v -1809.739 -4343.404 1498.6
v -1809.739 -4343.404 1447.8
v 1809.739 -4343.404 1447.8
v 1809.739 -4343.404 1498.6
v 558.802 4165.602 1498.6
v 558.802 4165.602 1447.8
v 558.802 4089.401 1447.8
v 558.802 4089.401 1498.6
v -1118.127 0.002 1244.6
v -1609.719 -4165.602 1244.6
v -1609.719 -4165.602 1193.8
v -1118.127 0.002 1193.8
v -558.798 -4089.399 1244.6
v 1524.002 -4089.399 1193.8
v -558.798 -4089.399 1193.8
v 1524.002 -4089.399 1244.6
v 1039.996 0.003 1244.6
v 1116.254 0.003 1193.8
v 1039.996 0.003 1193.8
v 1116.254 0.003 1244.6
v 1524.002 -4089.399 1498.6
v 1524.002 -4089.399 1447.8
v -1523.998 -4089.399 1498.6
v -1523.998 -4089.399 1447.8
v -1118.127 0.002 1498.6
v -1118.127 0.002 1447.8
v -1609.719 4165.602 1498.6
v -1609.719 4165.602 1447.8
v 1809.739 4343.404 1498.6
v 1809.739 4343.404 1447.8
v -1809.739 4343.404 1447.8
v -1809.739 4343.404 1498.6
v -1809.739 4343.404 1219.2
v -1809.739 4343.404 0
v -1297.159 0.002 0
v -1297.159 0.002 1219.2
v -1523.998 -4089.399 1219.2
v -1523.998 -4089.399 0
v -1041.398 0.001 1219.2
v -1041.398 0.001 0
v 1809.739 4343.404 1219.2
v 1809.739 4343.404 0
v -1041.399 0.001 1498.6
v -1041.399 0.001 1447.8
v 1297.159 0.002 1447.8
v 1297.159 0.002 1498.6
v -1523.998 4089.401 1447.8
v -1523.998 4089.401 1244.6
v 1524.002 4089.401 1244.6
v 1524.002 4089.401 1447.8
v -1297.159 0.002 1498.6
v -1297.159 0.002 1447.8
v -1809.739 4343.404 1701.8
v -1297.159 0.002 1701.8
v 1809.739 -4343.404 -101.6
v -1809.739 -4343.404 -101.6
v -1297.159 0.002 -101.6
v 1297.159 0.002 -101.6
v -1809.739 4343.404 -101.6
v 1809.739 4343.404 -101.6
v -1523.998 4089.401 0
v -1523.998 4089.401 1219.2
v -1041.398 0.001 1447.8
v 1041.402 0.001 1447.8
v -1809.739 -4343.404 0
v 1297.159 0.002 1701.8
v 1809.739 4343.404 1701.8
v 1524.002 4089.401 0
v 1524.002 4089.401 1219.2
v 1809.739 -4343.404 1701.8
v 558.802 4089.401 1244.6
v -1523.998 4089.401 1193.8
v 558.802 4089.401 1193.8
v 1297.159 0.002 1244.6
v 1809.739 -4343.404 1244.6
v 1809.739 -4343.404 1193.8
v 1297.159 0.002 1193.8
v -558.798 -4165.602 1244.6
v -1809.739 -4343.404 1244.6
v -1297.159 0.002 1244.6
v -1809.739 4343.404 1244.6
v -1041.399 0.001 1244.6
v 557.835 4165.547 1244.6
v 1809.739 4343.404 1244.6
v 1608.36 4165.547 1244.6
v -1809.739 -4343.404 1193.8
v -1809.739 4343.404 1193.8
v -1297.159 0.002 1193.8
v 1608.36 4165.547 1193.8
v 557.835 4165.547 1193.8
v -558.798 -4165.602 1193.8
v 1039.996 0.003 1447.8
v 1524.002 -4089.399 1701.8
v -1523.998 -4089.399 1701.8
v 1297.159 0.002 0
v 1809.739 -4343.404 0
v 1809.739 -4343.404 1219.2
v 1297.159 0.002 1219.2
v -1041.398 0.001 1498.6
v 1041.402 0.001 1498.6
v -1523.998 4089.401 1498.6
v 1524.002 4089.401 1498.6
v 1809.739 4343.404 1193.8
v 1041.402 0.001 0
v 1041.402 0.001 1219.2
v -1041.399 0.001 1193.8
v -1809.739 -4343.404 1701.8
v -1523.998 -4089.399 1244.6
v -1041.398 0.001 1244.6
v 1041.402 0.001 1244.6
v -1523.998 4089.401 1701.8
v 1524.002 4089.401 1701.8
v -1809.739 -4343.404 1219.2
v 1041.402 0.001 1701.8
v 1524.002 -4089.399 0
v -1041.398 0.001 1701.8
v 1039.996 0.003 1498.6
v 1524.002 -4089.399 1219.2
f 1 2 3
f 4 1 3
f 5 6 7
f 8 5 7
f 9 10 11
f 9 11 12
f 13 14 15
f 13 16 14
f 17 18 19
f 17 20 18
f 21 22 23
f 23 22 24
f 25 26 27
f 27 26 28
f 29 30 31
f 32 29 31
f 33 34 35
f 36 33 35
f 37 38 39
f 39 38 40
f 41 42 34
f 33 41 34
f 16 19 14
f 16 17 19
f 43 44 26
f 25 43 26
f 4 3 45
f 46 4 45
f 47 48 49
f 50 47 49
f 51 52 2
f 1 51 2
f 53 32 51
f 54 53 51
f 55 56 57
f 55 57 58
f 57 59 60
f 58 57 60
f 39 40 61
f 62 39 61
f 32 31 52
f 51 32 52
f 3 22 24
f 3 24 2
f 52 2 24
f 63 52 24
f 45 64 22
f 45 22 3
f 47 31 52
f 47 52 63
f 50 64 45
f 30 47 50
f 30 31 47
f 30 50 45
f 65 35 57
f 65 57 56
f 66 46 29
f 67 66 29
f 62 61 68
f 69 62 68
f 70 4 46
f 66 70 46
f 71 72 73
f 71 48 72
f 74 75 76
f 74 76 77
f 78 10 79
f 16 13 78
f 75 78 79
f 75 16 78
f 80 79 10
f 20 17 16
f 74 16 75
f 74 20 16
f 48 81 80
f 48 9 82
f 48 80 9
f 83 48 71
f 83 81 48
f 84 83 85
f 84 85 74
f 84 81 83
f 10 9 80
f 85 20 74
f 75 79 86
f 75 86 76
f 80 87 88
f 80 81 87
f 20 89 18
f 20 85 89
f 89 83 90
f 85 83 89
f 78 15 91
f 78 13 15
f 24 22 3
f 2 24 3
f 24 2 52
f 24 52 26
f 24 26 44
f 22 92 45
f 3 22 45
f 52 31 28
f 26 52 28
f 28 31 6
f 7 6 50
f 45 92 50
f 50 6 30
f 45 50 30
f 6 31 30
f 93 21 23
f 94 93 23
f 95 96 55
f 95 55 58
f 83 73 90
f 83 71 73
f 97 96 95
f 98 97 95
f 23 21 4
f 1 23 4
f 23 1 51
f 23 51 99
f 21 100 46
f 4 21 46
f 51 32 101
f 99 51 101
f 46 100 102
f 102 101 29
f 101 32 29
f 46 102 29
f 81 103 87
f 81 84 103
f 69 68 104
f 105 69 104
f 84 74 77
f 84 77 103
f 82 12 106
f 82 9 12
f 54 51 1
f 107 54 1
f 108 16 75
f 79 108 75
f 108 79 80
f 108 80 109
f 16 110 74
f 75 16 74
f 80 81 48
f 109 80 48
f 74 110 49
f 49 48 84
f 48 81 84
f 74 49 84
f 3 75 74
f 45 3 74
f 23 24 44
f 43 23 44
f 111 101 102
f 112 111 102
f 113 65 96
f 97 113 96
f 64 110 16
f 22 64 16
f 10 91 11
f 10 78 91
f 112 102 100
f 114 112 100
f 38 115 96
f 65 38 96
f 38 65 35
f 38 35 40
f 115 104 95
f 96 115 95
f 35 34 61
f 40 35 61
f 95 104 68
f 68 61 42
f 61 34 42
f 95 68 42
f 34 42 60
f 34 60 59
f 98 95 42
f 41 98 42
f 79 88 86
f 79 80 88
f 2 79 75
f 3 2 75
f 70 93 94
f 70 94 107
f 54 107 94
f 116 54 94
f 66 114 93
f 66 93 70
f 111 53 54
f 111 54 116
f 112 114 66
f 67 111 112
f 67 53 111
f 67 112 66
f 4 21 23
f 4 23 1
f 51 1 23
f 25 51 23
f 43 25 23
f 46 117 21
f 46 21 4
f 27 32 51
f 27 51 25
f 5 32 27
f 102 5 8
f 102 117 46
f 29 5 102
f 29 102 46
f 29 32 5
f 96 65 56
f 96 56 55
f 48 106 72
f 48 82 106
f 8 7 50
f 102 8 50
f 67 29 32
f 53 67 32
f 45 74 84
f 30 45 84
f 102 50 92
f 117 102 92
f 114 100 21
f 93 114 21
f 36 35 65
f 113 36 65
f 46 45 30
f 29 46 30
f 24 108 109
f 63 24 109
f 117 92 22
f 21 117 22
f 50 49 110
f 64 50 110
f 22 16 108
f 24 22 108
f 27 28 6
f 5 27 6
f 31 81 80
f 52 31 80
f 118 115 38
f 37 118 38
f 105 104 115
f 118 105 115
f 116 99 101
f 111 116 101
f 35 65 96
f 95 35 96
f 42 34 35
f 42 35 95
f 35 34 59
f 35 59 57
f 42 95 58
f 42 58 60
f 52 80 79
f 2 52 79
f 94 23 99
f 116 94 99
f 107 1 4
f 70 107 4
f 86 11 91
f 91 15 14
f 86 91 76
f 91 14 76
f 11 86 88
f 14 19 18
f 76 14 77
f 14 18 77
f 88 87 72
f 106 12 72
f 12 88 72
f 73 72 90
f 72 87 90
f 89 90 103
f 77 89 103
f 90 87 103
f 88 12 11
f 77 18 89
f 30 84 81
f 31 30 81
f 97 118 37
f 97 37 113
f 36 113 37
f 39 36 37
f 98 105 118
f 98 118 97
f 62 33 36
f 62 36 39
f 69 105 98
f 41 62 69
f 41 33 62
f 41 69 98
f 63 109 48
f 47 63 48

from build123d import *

# Parameters (mm, degrees)
F1_DEPTH  = 101.6
F2_DEPTH  = 1219.2
F5_DEPTH  = 25.4
F7_DEPTH  = 203.2
F10_DEPTH = 50.8
F13_DEPTH = 203.2


with BuildPart() as f1:
    # F0 (on Top) → F1 (new body)
    with BuildSketch(Plane.XY):
        Polygon((-1297.1585436, 0.0021844), (-1809.739078, -4343.4039624), (1809.739078, -4343.4039624), (1297.158569, 0.0021844), (1809.739078, 4343.4039878), (-1809.739078, 4343.4039878), align=None)
        Polygon((-1041.3984252, 0.0007366), (-1523.9984252, 4089.4007366), (1524.0015748, 4089.4007366), (1041.4015748, 0.0007366), (1524.0015748, -4089.3992634), (-1523.9984252, -4089.3992634), align=None, mode=Mode.SUBTRACT)
        Polygon((1524.0015748, 4089.4007366), (-1523.9984252, 4089.4007366), (-1041.3984252, 0.0007366), (-1523.9984252, -4089.3992634), (1524.0015748, -4089.3992634), (1041.4015748, 0.0007366), align=None)
    extrude(amount=-F1_DEPTH)


with BuildPart() as f2:
    # F0 (on Top) → F2 (new body)
    with BuildSketch(Plane.XY):
        Polygon((-1297.1585436, 0.0021844), (-1809.739078, -4343.4039624), (1809.739078, -4343.4039624), (1297.158569, 0.0021844), (1809.739078, 4343.4039878), (-1809.739078, 4343.4039878), align=None)
        Polygon((-1041.3984252, 0.0007366), (-1523.9984252, 4089.4007366), (1524.0015748, 4089.4007366), (1041.4015748, 0.0007366), (1524.0015748, -4089.3992634), (-1523.9984252, -4089.3992634), align=None, mode=Mode.SUBTRACT)
    extrude(amount=F2_DEPTH)


with BuildPart() as f5:
    # F4 (on offset) → F5 (new body, symmetric)
    with BuildSketch(Plane.XY.offset(1219.2)):
        Polygon((-1297.1585436, 0.0021844), (-1809.739078, -4343.4039624), (1809.739078, -4343.4039624), (1297.158569, 0.0021844), (1809.739078, 4343.4039878), (-1809.739078, 4343.4039878), align=None)
        Polygon((-1609.719158, -4165.6017018), (-1118.1268214, 0.0021844), (-1041.3985960579, 0.0007366032), (-1041.3985106292, 0.0014604999), (-1523.9984252, 4089.4007366), (558.8015748, 4089.4007366), (557.834927, 4165.54666), (1608.3599278, 4165.54666), (1116.2537492, 0.002921), (1039.9960912, 0.002921), (1524.0015748, -4089.3992634), (-558.7983998, -4089.3992634), (-558.7983998, -4165.6017018), align=None, mode=Mode.SUBTRACT)
    extrude(amount=F5_DEPTH, both=True)


with BuildPart() as f7:
    # F6 (on face) → F7 (new body)
    with BuildSketch(Plane.XY.offset(1244.6)):
        Polygon((-1297.1585436, 0.0021844), (-1809.739078, -4343.4039624), (1809.739078, -4343.4039624), (1297.158569, 0.0021844), (1809.739078, 4343.4039878), (-1809.739078, 4343.4039878), align=None)
        Polygon((-1041.3984252, 0.0007366), (-1523.9984252, 4089.4007366), (1524.0015748, 4089.4007366), (1041.4015748, 0.0007366), (1524.0015748, -4089.3992634), (-1523.9984252, -4089.3992634), align=None, mode=Mode.SUBTRACT)
    extrude(amount=F7_DEPTH)


with BuildPart() as f10:
    # F9 (on offset) → F10 (new body)
    with BuildSketch(Plane.XY.offset(1447.8)):
        Polygon((-1297.1585436, 0.0021844), (-1809.739078, -4343.4039624), (1809.739078, -4343.4039624), (1297.158569, 0.0021844), (1809.739078, 4343.4039878), (-1809.739078, 4343.4039878), align=None)
        Polygon((-1041.3985960579, 0.0007366032), (-1118.1268214, 0.0021844), (-1609.719158, 4165.6017018), (558.8015748, 4165.6017018), (558.8015748, 4089.4007366), (1524.0015748, 4089.4007366), (1039.9960912, 0.002921), (1524.0015748, -4089.3992634), (-558.7983998, -4089.3992634), (-1523.9984252, -4089.3992634), align=None, mode=Mode.SUBTRACT)
    extrude(amount=F10_DEPTH)


with BuildPart() as f13:
    # F12 (on offset) → F13 (new body)
    with BuildSketch(Plane.XY.offset(1498.6)):
        Polygon((-1297.1585436, 0.0021844), (-1809.739078, -4343.4039624), (1809.739078, -4343.4039624), (1297.158569, 0.0021844), (1809.739078, 4343.4039878), (-1809.739078, 4343.4039878), align=None)
        Polygon((-1041.3984252, 0.0007366), (-1523.9984252, 4089.4007366), (1524.0015748, 4089.4007366), (1041.4015748, 0.0007366), (1524.0015748, -4089.3992634), (-1523.9984252, -4089.3992634), align=None, mode=Mode.SUBTRACT)
    extrude(amount=F13_DEPTH)


solid = Compound([f1.part, f2.part, f5.part, f7.part, f10.part, f13.part])
